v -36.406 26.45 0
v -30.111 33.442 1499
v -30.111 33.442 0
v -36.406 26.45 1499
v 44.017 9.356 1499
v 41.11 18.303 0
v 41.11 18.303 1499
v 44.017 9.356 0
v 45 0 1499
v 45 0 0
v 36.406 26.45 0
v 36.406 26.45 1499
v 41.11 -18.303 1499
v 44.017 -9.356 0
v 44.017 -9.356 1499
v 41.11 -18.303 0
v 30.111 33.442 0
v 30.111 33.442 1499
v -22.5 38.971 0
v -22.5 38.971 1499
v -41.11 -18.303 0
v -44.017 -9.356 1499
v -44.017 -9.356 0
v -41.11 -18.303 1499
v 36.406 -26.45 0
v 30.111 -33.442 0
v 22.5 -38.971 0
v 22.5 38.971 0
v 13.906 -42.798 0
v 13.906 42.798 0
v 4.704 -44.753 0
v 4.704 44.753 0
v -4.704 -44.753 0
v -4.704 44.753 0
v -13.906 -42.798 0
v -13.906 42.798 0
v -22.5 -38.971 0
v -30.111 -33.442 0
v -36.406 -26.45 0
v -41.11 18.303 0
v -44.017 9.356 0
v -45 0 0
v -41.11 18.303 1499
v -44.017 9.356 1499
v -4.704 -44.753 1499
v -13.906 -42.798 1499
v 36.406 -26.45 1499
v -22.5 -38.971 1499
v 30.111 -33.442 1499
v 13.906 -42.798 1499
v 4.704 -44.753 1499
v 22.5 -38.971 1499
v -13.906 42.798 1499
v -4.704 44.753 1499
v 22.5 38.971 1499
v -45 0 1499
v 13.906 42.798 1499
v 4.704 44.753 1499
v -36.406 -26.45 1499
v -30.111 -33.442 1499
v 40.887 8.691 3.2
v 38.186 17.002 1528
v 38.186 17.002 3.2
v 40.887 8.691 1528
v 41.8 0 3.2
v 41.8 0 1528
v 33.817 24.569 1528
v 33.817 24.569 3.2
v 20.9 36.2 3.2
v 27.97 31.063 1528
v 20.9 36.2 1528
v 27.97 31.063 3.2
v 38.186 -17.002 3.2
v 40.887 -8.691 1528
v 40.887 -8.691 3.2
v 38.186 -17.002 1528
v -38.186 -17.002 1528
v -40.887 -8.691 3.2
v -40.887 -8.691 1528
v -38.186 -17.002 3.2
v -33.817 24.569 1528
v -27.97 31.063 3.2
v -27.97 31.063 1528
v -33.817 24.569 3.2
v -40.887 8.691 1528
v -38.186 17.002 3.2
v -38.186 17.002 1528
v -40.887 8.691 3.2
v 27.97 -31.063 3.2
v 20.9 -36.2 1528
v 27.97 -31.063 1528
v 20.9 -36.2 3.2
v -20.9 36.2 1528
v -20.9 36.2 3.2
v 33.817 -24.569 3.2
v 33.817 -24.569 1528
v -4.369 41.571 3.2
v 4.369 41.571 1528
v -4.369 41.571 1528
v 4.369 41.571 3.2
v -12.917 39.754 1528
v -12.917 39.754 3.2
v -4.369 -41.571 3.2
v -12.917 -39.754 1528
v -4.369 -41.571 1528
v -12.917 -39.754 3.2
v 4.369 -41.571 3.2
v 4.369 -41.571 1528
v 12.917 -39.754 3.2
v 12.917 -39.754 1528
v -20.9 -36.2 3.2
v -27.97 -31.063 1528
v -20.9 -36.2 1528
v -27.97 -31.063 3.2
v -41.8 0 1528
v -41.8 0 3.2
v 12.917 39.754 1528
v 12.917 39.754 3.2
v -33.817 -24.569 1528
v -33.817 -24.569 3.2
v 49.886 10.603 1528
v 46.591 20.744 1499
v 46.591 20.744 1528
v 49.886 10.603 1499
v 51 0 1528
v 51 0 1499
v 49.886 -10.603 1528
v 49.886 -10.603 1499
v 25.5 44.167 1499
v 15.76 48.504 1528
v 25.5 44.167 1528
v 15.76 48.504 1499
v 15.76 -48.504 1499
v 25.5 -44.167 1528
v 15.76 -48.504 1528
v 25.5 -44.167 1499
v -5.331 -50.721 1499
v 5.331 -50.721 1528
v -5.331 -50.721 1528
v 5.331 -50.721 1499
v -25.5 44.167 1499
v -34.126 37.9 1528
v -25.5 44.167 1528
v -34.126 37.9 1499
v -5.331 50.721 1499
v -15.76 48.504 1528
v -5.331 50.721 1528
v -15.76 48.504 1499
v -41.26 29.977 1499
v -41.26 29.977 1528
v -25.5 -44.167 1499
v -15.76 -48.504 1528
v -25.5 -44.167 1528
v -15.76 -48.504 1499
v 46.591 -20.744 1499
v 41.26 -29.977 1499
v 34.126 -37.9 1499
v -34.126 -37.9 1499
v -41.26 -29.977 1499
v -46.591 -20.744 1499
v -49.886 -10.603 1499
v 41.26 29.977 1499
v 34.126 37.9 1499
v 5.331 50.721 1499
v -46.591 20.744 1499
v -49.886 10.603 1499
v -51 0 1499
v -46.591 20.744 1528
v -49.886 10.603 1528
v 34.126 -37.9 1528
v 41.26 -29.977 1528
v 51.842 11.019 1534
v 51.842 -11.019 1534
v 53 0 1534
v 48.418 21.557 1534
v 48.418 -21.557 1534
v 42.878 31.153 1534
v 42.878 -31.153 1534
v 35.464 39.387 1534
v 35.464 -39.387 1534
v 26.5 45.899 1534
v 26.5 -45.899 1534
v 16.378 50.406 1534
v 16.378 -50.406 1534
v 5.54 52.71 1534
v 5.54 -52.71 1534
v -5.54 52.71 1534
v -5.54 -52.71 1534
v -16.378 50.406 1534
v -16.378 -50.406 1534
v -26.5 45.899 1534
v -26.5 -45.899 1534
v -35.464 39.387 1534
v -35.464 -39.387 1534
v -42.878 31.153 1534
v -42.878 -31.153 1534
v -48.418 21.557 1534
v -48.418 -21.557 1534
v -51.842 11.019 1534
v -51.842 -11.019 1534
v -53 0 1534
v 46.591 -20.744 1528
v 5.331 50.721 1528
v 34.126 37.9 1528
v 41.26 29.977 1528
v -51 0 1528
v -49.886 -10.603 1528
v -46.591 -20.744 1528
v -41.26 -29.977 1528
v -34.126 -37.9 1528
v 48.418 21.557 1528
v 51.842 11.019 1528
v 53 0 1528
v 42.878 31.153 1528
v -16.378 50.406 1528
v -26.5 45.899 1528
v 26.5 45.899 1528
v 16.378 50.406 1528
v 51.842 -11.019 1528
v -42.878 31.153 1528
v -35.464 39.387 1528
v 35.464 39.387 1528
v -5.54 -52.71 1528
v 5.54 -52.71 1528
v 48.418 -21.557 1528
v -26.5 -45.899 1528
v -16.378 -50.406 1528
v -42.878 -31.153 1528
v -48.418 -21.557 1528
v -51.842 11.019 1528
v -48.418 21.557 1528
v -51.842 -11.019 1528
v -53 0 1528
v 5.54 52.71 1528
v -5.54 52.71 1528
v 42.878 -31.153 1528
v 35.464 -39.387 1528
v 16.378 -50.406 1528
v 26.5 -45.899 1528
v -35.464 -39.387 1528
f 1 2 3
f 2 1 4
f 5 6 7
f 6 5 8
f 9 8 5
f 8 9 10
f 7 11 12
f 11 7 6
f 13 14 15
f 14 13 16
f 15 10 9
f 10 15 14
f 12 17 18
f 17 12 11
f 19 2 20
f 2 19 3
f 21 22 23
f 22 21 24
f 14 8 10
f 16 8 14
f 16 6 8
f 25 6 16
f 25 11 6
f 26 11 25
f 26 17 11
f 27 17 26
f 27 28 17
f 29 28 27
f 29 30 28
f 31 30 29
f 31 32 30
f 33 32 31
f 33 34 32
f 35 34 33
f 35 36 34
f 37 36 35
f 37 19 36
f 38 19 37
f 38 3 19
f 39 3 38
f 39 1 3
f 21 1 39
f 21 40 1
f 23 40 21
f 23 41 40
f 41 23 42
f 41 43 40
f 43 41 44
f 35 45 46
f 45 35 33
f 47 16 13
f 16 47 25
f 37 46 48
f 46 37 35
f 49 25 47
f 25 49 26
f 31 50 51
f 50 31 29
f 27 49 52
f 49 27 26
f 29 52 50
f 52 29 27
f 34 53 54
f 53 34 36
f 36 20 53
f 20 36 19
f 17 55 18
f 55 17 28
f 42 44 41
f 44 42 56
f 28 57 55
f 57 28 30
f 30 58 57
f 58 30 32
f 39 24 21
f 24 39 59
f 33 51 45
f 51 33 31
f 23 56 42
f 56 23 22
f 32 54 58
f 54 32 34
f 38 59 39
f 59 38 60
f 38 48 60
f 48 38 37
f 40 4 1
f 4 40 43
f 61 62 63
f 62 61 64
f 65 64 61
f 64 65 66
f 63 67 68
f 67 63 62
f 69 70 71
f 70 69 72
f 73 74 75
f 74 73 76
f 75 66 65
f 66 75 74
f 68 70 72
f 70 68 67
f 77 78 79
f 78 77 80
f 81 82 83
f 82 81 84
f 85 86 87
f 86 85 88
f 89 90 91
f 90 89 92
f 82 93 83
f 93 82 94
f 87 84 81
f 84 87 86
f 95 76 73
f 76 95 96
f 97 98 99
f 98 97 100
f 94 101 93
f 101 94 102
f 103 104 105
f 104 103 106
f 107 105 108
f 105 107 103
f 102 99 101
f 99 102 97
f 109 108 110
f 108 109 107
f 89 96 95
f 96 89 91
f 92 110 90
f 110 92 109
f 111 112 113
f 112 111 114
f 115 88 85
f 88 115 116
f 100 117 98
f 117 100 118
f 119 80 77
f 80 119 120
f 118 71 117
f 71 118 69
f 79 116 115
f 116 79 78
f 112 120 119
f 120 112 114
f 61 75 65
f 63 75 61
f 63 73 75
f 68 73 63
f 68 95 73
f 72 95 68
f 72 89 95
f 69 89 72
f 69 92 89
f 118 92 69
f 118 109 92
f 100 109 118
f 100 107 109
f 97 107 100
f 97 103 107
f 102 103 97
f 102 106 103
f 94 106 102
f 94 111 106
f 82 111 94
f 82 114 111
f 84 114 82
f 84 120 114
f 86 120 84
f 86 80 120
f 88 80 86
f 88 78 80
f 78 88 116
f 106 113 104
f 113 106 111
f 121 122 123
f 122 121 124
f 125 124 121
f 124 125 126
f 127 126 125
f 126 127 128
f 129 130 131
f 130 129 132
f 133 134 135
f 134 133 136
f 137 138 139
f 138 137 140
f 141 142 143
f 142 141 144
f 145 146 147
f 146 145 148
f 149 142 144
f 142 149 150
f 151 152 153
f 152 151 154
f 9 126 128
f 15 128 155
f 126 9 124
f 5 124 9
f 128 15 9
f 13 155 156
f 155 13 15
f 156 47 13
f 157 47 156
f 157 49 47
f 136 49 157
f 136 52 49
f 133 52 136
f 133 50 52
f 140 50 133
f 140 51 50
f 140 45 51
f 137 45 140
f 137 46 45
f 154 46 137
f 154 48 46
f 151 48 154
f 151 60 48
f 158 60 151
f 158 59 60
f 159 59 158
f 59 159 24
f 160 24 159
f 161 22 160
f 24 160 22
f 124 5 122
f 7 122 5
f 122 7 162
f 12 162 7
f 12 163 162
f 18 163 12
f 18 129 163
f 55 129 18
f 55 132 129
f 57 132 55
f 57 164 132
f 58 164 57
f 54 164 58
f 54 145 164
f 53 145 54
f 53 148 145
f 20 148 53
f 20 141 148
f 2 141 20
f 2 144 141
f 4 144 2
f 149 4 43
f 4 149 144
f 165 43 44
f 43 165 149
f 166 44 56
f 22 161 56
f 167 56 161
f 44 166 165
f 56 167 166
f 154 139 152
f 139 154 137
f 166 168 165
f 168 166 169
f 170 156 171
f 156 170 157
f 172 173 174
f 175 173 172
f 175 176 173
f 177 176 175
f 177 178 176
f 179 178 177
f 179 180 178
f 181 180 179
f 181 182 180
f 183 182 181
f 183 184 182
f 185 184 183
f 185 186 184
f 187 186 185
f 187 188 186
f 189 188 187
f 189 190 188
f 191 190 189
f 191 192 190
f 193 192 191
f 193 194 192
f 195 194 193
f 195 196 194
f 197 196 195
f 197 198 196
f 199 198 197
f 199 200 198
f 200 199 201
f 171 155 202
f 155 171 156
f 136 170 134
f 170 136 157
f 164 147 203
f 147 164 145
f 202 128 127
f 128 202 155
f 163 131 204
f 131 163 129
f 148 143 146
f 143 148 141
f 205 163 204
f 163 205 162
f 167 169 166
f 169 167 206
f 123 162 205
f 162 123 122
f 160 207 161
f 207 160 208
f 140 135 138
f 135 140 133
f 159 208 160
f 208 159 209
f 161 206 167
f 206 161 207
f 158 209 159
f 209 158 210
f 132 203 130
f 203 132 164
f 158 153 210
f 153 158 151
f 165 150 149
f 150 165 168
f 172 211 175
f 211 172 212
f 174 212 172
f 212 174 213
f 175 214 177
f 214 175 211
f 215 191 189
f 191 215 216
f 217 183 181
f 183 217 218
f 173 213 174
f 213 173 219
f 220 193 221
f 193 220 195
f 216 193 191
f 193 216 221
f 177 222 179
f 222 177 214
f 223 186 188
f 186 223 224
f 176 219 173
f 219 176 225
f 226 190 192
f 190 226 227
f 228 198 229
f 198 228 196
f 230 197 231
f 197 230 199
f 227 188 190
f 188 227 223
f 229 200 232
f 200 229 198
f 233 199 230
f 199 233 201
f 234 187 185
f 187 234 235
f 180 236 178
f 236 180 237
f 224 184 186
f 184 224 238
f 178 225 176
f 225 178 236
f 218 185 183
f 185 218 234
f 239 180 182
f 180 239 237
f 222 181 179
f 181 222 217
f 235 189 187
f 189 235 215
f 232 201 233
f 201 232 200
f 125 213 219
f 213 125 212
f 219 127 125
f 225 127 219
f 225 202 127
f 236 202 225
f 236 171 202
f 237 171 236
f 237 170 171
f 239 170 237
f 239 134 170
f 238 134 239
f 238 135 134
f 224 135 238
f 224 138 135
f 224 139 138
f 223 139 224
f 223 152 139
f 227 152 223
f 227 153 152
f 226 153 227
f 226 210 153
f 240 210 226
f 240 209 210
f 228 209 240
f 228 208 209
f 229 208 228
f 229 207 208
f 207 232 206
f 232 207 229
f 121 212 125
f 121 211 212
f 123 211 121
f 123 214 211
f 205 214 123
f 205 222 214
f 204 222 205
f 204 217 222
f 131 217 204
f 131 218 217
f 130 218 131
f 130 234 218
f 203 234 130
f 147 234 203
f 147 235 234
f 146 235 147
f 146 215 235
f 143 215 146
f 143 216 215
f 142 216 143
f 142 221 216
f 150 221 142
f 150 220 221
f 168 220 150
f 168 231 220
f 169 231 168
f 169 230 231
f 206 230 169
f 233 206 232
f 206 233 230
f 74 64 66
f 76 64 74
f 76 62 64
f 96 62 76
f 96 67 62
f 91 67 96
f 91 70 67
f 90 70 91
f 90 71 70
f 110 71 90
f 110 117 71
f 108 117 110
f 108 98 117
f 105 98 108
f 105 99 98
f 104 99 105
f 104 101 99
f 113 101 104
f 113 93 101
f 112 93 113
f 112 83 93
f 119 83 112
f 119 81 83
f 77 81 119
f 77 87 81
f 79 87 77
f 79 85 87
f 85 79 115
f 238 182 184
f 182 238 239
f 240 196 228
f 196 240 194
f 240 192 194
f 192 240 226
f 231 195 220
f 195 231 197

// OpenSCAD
// Parameters
nominal_diameter_mm = 90; //[45:180:1]
length_mm = 1500; //[750:3000:10]
wall_thickness_mm = 3.2; //[1.6:6.4:0.1]
include_end_fitting = 1; //[0:1:1]
center = 0; //[0:1:1]
fit_overlap_mm = 1; //[0.5:2:0.1]
fitting_length_mm = 35; //[15:70:1]
fitting_od_extra_mm = 6; //[2:15:0.5]
fitting_wall_extra_mm = 1.2; //[0.2:3:0.1]
fitting_stop_ring_len_mm = 6; //[2:15:0.5]
fitting_stop_ring_extra_mm = 2; //[0.5:6:0.5]

// HT Pipe - complete geometry
module ht_pipe() {
  color([0.85, 0.85, 0.8]) {
    // Pipe body
    difference() {
      cylinder(h=length_mm, r=nominal_diameter_mm/2, center=center == 1);
      translate([0, 0, wall_thickness_mm])
        cylinder(h=length_mm, r=nominal_diameter_mm/2 - wall_thickness_mm, center=center == 1);
    }
    
    // End fitting detail
    if (include_end_fitting == 1) {
      translate([0, 0, length_mm - fit_overlap_mm]) {
        difference() {
          cylinder(h=fitting_length_mm, r=nominal_diameter_mm/2 + fitting_od_extra_mm, center=false);
          cylinder(h=fitting_length_mm, r=nominal_diameter_mm/2 - wall_thickness_mm, center=false);
        }
        // Stop ring
        translate([0, 0, fitting_length_mm - fitting_stop_ring_len_mm])
          cylinder(h=fitting_stop_ring_len_mm, r=nominal_diameter_mm/2 + fitting_od_extra_mm + fitting_stop_ring_extra_mm, center=false);
      }
    }
  }
}

// Assembly
module assembly() {
  ht_pipe();
}

assembly();
